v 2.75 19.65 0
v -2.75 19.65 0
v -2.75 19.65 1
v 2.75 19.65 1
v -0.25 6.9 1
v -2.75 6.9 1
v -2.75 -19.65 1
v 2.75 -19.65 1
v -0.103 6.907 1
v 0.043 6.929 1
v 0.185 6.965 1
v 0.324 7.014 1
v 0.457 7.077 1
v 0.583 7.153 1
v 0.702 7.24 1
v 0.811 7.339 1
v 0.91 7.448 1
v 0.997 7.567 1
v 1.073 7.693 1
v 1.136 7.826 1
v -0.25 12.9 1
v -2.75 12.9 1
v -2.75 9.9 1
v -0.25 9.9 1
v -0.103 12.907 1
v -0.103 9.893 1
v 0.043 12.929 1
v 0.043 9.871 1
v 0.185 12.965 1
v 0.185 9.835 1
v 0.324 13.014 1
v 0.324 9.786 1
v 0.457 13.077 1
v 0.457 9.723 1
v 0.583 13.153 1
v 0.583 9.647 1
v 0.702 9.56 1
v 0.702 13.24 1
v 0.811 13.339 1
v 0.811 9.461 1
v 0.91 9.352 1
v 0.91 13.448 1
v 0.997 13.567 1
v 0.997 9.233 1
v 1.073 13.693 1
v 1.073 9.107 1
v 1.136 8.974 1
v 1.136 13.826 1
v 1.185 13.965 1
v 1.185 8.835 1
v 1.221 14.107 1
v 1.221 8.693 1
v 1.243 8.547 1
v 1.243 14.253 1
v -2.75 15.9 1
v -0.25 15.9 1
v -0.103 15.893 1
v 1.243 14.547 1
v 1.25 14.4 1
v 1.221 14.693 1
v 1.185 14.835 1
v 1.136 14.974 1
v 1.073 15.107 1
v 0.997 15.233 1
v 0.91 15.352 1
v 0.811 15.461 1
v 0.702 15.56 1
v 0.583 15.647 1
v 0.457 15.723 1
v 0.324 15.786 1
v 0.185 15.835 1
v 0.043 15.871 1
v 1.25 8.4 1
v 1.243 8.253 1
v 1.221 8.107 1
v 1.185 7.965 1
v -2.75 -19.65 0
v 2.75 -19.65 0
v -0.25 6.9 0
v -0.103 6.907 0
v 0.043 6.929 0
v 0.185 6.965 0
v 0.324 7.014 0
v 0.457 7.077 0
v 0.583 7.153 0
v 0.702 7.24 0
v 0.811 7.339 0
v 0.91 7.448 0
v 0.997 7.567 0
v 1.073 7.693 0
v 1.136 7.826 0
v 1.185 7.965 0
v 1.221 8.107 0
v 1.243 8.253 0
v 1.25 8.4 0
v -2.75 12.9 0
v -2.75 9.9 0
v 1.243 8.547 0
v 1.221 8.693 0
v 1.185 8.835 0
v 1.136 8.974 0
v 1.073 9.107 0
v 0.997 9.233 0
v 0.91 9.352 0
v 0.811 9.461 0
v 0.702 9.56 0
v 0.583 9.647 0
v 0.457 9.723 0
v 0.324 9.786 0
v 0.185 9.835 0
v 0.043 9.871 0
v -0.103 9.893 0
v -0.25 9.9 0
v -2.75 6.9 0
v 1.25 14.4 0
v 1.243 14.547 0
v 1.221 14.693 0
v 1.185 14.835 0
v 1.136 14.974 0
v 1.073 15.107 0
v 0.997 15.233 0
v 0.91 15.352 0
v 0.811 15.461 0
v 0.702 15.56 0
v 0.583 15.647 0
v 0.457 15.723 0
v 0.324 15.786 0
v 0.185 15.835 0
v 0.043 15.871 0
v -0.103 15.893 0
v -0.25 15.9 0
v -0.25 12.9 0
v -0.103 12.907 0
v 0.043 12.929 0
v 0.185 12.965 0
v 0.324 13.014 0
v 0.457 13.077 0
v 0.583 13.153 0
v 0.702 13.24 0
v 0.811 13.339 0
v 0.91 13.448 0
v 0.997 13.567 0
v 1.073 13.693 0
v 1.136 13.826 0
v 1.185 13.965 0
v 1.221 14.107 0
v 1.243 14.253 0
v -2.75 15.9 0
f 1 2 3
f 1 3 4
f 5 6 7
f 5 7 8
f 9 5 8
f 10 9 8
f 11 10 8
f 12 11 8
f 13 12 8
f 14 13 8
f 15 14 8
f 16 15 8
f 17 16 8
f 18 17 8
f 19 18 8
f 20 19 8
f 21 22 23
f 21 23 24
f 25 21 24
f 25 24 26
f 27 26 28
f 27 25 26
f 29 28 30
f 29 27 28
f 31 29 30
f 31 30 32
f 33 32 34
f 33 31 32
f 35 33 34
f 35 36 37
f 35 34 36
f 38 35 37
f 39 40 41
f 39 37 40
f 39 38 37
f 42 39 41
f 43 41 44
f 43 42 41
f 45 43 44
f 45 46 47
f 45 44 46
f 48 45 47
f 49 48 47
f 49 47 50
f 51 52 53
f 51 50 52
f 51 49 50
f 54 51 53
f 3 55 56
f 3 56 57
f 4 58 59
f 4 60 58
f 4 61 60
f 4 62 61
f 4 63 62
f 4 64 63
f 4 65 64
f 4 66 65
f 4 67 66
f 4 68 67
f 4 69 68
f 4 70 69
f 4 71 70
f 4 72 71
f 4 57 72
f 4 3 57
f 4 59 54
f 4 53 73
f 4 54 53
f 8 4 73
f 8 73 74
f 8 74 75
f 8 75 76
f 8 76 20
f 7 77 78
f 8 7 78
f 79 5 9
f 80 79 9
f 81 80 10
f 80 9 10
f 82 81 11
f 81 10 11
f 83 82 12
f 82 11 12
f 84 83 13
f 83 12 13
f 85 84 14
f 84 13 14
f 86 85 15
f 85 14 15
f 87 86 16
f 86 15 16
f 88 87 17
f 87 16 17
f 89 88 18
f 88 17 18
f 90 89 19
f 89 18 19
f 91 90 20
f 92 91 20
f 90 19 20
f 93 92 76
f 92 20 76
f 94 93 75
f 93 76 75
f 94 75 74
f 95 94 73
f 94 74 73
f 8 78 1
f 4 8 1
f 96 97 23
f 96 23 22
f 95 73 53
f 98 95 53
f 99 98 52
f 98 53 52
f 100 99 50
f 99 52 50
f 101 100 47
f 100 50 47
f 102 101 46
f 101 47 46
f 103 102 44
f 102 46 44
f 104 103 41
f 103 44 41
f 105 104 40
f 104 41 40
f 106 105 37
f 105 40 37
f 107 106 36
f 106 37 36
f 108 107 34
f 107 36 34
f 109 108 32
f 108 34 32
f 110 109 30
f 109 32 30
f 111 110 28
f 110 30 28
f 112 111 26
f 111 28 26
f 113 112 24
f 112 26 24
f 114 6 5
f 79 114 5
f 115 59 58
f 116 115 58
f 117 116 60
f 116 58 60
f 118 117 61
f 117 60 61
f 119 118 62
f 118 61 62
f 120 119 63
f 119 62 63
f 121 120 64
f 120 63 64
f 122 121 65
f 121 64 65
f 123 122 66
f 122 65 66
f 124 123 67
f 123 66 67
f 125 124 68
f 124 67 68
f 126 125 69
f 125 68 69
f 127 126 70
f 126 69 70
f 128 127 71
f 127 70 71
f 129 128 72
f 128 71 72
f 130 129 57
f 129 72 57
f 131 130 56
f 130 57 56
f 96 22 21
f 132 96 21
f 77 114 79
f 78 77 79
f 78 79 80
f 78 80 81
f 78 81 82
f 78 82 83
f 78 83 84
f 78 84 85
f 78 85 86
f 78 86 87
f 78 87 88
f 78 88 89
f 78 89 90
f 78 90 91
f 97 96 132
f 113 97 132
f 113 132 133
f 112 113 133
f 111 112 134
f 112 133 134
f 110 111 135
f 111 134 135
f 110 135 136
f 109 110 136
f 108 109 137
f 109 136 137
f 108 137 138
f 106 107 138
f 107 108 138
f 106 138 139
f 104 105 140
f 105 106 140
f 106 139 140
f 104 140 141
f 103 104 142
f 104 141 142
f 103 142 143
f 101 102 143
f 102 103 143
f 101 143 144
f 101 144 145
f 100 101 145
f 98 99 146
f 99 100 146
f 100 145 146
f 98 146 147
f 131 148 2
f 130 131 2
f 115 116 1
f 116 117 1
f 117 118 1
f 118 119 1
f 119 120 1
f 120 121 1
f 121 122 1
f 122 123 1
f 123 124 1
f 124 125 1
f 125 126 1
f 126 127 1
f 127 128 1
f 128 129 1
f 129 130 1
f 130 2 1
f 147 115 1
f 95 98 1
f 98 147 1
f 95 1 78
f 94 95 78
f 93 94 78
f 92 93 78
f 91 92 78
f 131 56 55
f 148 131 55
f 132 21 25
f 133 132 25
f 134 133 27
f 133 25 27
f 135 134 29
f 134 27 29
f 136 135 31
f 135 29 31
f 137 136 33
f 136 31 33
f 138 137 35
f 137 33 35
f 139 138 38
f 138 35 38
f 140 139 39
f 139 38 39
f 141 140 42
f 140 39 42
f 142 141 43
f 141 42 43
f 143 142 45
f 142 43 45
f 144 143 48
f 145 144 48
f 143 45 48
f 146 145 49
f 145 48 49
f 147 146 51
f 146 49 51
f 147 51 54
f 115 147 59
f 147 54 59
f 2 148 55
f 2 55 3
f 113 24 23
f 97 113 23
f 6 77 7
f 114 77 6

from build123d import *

# Parameters (mm, degrees)
SKETCH1_W           = 5.5
SKETCH1_H           = 39.3
BOSS_EXTRUDE1_DEPTH = 1
CUT_EXTRUDE2_DEPTH  = 1


with BuildPart() as part:
    # Sketch1 → Boss-Extrude1 (new body)
    with BuildSketch(Plane.XY):
        Rectangle(SKETCH1_W, SKETCH1_H)
    extrude(amount=BOSS_EXTRUDE1_DEPTH)

    # Sketch2 → Cut-Extrude2 (cut)
    with BuildSketch(Plane.XY.offset(1)):
        with BuildLine():
            ThreePointArc((-0.25, 12.9), (-1.75, 14.4), (-0.25, 15.9))
            Line((-0.25, 15.9), (-2.75, 15.9))
            Line((-2.75, 15.9), (-2.75, 12.9))
            Line((-2.75, 12.9), (-0.25, 12.9))
        make_face()
        with BuildLine():
            ThreePointArc((1.25, 14.4), (0.810660172, 15.460660172), (-0.25, 15.9))
            Line((-0.25, 15.9), (-0.25, 12.9))
            ThreePointArc((-0.25, 12.9), (0.810660172, 13.339339828), (1.25, 14.4))
        make_face()
        with BuildLine():
            Line((-0.25, 12.9), (-0.25, 15.9))
            ThreePointArc((-0.25, 15.9), (-1.75, 14.4), (-0.25, 12.9))
        make_face()
        with BuildLine():
            Line((-0.25, 9.9), (-2.75, 9.9))
            Line((-2.75, 9.9), (-2.75, 6.9))
            Line((-2.75, 6.9), (-0.25, 6.9))
            ThreePointArc((-0.25, 6.9), (-1.75, 8.4), (-0.25, 9.9))
        make_face()
        with BuildLine():
            ThreePointArc((1.25, 8.4), (0.810660172, 9.460660172), (-0.25, 9.9))
            Line((-0.25, 9.9), (-0.25, 6.9))
            ThreePointArc((-0.25, 6.9), (0.810660172, 7.339339828), (1.25, 8.4))
        make_face()
        with BuildLine():
            Line((-0.25, 6.9), (-0.25, 9.9))
            ThreePointArc((-0.25, 9.9), (-1.75, 8.4), (-0.25, 6.9))
        make_face()
    extrude(amount=-CUT_EXTRUDE2_DEPTH, mode=Mode.SUBTRACT)


solid = part.part
